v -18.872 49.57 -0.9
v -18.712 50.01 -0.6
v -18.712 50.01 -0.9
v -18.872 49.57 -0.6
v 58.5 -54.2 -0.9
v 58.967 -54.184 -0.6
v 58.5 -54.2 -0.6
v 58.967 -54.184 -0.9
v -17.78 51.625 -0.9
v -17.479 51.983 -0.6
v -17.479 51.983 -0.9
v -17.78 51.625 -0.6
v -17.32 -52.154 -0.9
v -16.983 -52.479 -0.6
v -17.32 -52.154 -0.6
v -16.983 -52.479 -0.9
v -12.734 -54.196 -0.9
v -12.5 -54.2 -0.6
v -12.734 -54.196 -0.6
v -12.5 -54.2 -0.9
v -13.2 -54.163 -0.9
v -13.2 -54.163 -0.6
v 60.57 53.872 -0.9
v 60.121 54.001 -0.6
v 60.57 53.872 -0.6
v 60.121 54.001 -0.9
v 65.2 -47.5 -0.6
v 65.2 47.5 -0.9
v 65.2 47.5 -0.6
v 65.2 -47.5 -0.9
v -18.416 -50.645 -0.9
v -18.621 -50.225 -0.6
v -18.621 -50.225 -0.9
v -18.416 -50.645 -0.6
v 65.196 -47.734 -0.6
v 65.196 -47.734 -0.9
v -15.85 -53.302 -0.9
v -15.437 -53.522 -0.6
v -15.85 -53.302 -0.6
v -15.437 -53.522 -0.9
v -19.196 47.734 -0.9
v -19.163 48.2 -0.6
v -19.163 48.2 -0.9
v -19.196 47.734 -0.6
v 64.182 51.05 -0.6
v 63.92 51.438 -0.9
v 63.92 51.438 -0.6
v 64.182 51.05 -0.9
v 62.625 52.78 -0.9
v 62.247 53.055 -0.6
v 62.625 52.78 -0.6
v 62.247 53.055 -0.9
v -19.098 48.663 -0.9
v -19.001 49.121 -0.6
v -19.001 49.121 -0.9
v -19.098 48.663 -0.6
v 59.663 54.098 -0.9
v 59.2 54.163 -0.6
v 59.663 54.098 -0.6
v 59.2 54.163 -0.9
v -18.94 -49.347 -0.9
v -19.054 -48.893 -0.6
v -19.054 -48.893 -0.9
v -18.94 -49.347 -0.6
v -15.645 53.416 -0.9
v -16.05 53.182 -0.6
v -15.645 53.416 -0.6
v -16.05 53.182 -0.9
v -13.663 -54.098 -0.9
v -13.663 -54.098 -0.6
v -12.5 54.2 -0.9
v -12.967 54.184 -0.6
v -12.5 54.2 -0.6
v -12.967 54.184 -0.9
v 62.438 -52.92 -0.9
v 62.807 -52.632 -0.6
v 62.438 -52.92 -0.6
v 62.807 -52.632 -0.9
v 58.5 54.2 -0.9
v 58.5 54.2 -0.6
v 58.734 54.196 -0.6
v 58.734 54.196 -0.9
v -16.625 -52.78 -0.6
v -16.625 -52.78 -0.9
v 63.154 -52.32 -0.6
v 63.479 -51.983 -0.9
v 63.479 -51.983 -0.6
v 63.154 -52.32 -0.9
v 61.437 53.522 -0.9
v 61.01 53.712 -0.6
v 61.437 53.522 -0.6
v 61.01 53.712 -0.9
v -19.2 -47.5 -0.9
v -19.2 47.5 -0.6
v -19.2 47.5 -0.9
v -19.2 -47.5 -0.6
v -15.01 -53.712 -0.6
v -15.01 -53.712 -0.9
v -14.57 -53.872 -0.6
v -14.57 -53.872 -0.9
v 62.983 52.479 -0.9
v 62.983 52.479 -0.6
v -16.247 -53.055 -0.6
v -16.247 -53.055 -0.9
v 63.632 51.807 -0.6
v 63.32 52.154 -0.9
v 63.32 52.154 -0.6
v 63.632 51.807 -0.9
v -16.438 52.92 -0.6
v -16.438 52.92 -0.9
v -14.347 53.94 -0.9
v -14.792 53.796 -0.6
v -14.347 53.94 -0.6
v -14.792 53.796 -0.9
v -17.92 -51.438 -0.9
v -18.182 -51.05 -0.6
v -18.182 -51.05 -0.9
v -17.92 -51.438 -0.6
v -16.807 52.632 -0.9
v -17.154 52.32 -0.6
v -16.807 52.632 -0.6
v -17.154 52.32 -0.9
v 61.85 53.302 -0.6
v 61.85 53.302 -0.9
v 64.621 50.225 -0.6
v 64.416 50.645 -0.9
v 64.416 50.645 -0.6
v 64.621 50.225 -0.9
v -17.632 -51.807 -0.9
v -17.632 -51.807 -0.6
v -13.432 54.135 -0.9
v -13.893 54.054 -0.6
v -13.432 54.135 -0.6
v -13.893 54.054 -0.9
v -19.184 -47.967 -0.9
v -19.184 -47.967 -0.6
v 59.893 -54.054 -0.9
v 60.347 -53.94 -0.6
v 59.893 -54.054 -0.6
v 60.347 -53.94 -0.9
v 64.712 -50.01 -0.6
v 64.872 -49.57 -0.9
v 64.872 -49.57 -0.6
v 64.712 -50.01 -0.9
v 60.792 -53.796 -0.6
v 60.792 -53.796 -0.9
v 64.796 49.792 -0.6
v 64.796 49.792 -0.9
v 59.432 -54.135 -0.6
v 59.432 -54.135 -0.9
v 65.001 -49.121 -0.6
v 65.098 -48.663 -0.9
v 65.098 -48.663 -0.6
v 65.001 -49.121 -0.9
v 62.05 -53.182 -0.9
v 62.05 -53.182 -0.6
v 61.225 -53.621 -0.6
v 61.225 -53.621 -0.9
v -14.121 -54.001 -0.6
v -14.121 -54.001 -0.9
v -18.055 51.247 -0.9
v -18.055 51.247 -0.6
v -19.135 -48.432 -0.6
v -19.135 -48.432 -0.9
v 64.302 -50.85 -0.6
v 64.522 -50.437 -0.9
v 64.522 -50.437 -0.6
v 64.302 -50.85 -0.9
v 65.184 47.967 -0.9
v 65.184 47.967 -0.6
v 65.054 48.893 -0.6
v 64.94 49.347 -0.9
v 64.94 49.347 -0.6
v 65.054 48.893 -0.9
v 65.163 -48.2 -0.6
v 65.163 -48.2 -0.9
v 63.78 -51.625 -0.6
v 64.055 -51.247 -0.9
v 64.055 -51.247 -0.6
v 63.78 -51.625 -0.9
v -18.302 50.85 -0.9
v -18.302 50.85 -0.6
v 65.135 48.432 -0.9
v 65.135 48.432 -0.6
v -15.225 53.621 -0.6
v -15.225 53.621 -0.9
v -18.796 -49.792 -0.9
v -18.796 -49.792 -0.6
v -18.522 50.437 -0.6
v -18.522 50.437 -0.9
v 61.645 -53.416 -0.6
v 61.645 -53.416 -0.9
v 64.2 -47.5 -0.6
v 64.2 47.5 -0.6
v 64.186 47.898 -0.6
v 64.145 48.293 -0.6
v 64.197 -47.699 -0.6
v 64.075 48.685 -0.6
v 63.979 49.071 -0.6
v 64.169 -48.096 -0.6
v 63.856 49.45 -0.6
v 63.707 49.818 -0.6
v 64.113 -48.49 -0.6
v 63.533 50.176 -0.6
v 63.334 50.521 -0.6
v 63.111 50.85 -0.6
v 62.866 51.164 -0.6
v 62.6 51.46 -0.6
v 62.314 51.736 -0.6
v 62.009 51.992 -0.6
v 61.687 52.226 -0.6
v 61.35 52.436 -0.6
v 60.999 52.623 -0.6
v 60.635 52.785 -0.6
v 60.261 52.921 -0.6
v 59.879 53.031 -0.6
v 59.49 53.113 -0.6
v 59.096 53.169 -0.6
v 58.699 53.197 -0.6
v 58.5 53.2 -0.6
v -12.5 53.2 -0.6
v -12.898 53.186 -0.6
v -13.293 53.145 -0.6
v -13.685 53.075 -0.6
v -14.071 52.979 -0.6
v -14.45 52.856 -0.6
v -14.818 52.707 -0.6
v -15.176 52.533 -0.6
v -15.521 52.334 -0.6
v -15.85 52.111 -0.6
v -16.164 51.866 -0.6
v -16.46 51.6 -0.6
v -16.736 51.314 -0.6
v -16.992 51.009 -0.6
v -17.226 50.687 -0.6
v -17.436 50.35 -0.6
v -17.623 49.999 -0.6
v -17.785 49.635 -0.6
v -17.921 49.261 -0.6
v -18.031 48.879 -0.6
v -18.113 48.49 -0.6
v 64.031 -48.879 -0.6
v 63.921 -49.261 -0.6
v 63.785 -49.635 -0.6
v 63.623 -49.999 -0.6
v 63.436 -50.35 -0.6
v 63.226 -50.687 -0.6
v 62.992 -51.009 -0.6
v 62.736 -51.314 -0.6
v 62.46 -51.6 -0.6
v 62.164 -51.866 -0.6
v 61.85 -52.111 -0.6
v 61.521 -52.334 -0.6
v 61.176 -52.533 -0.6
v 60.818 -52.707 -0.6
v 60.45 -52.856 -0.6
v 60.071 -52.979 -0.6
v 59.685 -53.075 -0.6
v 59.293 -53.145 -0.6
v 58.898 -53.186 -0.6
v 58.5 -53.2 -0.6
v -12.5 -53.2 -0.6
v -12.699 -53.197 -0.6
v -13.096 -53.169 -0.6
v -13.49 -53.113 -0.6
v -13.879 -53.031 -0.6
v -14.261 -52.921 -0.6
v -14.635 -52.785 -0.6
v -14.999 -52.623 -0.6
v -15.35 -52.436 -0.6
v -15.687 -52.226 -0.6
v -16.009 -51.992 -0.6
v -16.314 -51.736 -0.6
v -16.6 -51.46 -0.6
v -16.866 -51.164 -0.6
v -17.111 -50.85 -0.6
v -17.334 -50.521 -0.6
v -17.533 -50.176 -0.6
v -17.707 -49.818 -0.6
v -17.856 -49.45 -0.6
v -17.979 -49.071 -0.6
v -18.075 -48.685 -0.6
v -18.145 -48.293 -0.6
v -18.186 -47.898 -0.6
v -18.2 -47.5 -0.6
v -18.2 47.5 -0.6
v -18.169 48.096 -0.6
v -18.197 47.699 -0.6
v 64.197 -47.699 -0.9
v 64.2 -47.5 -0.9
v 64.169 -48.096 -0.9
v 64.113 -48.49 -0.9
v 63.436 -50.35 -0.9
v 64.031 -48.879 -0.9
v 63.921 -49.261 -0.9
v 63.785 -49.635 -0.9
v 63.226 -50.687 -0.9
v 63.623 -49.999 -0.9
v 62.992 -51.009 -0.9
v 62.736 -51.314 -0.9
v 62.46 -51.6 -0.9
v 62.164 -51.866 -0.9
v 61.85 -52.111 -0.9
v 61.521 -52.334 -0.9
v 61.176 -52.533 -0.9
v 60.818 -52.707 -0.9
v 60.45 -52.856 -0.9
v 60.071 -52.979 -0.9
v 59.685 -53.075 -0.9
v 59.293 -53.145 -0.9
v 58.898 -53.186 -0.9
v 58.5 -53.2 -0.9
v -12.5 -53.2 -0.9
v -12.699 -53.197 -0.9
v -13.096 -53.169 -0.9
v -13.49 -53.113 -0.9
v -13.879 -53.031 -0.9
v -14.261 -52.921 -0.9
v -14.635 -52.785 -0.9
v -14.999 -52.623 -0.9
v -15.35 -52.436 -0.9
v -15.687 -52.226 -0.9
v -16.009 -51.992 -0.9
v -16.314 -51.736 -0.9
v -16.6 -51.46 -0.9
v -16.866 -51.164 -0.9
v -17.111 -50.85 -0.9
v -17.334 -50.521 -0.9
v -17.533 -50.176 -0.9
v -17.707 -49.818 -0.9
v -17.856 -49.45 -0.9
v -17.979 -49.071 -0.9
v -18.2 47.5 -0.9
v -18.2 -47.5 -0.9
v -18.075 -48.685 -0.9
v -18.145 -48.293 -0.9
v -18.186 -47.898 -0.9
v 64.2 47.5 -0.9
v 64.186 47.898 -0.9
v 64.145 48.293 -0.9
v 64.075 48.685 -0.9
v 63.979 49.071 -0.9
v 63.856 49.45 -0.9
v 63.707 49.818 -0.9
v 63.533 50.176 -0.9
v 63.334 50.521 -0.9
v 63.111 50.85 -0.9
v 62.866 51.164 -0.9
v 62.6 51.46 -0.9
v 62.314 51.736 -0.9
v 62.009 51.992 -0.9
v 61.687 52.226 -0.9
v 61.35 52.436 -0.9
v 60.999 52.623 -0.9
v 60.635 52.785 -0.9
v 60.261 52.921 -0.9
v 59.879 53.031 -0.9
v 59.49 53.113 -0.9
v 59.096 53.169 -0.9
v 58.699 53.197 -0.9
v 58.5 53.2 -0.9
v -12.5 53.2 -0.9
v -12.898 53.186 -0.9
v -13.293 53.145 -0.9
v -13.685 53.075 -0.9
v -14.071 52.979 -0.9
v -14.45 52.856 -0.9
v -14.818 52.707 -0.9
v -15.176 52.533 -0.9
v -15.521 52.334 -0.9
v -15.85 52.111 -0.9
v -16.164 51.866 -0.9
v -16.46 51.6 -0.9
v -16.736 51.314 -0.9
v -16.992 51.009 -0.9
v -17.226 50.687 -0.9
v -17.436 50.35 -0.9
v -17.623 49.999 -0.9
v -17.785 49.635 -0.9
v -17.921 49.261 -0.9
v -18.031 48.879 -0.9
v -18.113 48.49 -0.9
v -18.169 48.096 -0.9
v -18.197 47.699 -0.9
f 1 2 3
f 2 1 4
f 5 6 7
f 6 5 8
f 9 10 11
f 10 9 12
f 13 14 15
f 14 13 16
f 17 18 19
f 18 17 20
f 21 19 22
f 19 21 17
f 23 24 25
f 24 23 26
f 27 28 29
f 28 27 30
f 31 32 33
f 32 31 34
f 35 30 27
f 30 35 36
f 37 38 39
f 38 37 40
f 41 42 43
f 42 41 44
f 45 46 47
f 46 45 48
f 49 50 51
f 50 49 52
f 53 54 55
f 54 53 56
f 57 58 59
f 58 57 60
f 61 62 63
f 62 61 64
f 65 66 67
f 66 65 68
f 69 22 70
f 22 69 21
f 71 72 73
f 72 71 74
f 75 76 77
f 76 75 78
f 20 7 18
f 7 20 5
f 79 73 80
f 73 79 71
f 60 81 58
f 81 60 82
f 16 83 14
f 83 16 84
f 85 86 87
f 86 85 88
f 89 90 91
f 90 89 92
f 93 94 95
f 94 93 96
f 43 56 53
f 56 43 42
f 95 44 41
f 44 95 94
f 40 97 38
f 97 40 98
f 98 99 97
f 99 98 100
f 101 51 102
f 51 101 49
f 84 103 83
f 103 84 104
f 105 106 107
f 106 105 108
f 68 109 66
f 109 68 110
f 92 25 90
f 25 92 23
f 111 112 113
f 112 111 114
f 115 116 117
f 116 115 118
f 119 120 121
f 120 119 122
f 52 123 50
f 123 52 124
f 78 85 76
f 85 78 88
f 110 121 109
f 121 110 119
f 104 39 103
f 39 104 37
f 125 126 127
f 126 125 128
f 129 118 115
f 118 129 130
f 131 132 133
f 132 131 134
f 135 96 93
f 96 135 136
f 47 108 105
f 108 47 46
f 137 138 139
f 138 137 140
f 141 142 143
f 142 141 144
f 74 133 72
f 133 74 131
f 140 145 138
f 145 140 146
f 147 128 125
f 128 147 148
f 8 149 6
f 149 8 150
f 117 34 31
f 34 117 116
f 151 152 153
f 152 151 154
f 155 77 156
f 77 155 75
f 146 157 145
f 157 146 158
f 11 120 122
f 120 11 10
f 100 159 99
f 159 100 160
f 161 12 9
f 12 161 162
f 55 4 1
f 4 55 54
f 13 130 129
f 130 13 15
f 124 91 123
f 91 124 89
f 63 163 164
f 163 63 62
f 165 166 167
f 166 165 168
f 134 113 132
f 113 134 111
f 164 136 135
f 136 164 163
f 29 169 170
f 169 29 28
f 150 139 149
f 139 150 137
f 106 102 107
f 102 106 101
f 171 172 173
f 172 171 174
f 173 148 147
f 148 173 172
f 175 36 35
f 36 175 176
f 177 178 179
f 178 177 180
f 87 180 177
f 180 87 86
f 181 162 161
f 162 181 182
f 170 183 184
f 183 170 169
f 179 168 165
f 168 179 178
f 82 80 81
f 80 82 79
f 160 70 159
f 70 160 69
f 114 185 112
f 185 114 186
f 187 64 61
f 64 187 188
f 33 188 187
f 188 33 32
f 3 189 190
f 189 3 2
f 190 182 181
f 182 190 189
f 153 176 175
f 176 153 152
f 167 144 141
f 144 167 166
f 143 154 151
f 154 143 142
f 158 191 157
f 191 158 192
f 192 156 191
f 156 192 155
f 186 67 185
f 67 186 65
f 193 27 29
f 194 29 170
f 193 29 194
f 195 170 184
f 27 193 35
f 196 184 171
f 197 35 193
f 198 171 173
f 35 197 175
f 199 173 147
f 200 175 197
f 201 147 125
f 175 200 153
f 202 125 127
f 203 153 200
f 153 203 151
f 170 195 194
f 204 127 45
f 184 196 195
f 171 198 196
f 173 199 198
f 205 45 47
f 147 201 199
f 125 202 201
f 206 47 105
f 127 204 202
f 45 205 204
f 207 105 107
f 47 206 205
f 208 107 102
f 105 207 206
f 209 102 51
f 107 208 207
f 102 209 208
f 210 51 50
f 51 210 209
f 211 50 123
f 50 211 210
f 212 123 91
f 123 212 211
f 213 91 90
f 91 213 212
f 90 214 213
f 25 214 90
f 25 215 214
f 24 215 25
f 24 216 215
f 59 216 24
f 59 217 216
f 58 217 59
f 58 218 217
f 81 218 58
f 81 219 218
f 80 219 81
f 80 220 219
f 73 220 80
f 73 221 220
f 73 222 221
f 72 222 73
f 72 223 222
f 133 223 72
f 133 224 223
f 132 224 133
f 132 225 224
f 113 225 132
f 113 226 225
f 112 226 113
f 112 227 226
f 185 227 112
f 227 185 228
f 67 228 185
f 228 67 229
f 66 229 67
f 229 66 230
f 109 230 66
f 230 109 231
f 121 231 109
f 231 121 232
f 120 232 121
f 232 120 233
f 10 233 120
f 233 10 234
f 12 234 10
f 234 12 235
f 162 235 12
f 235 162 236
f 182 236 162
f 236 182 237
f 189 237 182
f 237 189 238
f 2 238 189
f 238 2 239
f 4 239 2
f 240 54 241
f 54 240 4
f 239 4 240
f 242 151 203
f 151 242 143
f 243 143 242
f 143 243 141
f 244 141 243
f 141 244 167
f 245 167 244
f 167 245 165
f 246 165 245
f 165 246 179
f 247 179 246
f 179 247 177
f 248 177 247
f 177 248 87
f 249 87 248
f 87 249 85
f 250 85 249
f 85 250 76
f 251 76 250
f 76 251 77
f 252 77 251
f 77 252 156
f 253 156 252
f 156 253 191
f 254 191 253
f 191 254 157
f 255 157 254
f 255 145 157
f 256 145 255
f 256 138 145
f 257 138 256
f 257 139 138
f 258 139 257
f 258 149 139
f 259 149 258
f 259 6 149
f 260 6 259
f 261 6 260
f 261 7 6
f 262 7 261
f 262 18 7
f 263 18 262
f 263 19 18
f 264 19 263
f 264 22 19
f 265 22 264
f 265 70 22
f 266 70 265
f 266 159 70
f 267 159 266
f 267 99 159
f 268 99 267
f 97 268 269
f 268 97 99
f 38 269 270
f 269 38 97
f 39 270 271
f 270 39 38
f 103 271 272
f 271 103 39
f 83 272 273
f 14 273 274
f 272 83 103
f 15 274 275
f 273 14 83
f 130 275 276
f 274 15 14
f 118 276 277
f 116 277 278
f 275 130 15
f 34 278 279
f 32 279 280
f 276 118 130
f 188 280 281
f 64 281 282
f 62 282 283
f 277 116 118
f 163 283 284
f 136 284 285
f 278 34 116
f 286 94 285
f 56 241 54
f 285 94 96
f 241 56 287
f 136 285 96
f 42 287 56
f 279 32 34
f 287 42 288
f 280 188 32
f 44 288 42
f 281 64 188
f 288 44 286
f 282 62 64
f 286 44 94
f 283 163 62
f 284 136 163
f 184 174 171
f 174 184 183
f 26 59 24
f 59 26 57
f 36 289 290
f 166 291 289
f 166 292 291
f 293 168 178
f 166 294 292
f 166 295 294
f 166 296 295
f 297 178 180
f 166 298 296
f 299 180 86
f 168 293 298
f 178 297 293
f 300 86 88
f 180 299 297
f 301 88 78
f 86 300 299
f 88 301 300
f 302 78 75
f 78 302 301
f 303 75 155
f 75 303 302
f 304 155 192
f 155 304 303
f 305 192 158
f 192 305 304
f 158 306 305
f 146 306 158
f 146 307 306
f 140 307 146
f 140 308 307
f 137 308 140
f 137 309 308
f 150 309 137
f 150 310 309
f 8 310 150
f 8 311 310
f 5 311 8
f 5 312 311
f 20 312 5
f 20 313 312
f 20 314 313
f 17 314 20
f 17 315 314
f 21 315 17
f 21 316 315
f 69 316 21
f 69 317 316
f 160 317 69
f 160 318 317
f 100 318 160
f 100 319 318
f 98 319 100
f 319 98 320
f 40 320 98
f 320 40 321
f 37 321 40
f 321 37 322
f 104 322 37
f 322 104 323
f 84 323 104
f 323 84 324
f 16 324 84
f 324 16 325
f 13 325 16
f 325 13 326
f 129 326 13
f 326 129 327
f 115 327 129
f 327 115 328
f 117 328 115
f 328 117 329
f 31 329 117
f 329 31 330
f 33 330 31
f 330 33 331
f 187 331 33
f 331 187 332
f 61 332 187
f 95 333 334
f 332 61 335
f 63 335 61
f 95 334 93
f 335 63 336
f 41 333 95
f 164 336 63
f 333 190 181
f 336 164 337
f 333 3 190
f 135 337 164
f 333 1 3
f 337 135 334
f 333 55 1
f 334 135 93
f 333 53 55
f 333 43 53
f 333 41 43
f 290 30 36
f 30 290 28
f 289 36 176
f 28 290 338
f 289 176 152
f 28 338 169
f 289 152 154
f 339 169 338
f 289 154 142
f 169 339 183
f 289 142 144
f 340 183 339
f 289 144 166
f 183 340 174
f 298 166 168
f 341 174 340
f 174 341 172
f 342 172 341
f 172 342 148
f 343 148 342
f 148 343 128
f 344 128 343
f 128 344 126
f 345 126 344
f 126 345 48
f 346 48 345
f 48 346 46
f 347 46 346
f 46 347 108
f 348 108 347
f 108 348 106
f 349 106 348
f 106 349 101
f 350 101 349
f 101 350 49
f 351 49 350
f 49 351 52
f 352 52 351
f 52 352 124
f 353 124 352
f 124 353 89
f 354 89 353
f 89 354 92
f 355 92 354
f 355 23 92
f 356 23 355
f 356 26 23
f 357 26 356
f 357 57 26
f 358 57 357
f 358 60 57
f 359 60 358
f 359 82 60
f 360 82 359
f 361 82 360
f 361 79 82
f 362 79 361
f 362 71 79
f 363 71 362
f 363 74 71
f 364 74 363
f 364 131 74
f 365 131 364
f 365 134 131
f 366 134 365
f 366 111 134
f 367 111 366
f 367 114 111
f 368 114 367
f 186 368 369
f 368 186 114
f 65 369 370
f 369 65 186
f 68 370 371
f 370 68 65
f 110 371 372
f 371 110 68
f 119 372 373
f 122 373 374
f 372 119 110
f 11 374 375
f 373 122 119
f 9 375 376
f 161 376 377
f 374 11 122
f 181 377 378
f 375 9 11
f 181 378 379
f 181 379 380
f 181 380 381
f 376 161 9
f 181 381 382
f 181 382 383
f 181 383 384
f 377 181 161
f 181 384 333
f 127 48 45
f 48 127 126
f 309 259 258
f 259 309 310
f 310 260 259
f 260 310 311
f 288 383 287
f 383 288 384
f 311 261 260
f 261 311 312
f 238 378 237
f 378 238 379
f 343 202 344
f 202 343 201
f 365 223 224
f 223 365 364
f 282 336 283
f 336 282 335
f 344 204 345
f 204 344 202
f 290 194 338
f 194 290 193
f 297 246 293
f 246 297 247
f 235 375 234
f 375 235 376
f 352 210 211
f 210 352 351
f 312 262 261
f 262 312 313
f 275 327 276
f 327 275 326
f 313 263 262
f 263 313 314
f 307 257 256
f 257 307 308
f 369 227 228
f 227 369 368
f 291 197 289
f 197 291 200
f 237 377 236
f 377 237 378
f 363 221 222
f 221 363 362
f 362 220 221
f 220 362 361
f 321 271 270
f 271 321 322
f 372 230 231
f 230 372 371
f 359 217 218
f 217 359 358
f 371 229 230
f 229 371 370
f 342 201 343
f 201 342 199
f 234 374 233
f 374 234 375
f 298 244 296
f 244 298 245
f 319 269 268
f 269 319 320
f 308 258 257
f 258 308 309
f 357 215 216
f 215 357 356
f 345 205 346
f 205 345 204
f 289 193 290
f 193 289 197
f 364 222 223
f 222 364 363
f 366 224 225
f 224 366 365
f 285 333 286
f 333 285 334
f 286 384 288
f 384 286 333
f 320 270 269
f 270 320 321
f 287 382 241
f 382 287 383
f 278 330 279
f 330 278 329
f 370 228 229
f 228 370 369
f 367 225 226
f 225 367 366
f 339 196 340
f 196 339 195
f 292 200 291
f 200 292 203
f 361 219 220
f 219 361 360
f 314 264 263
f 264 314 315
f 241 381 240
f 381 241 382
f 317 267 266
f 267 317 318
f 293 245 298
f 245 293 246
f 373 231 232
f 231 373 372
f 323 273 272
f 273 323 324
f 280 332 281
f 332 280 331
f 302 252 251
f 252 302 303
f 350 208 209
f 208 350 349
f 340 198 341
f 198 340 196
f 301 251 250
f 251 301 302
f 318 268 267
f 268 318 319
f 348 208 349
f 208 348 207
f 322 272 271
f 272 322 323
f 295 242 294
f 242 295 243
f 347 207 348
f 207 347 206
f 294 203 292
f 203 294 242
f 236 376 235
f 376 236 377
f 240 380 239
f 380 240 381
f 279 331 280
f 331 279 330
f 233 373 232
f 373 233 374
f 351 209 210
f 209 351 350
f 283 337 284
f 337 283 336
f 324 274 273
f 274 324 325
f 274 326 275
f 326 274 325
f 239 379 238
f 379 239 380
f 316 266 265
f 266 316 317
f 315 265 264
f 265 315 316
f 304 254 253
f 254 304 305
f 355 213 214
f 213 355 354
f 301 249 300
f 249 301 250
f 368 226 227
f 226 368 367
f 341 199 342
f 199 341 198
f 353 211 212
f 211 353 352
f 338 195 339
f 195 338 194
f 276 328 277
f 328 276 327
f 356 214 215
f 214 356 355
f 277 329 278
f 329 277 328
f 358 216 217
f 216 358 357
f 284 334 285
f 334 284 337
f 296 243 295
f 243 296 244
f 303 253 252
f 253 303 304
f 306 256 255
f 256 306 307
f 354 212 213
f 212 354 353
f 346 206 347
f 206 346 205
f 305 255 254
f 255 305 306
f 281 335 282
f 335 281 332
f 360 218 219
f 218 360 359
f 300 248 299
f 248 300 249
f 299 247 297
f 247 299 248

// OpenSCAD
$fa=4 + 0; // default minimum facet angle is now 0.5
$fs=0.05 + 0; // default minimum facet size is now 0.05 mm
eps = .005 + 0;

/* [Print Info] */
// Nozzle diameter
_n = 0.4;
// Line Thickness
_t = _n + .05;
// Layer Height
_l = 0.3;

/* [Case Dimensions] */
// Case outer width (x direction)
cox = 30;
// Case outer length (y direction)
coy = 100;
// Case height in layers (z direction) of first side
cl1 = 25;
cz1 = _l * cl1;
// Case height in layers (z direction) of second side
cl2 = 25;
cz2 = _l * cl2;
// Case corner radius
cr = 2.5;
// Spine excess width
cst = 1;
// Connection flap height in layers (0 for disconnected)
cfl = 3;
cfz = cfl * _l;
// Connection flap offset (0 for flush with case)
cfo = 1.2;
// Wall thickness
tw = .9;

cx = cox - cr * 2;
cy = coy - cr * 2;



/* [Magnet] */
// Magnet Hole Style
mSt = 1; // [0: None, 1: Exposed]
// Magnet Hole Radius
mr = 2.45;
// Magnet Hole Depth (in layers)
ml = 7;
// Minimum magnet bottom layers
mbl = 3 + 0;
mbz = mbl * _l;
// Chamfer around top/bottom of magnet holes (in layers)
mcl = 2;

/* [Design] */
// Design Style
ds = 1; // [0: None, 1: Full Inset panel]
// Panel Offset (for inset panel design)
dpo = 1.8;
// Export Panel Outline in 2d
ep2d = false;
// Export Panel
ep = true;
// DXF Import Path
dxfPath = "/home/gouda/Documents/Models/2D/foldCasePanelCharge.dxf";
// Total DXF Layer Count
dxfLayers = 2;
// Layer to Export (-1 for background)
dxfTargetLayer = 0;

mcz = mcl * _l;
mz = (ml + mcl) * _l;

totalX = (cx * 2 + cz1 + cz2 + cst + cr * 2);

module magnetHole(r = mr, h = mz, l = _l, c = mcz) {
  cylinder(r = r, h = h - c + eps);
  translate([0, 0, h - c]) cylinder(r2 = r-c, r1 = r, h = c);
}

module caseBase(x = cx, y = cy, z = cz1, r = cr, fz = cfz, fo = cfo, mhr = mr) {
  mhr2 = mhr * 1.75;

  difference() {
    linear_extrude(z) offset(r=cr) square([cx, cy], center = true);
    for (ix=[-1:2:1]) {
      for (iy=[-1:2:1]) {
        translate([ix * (x/2+cr) - ix * (mhr2), iy * (y/2+cr) - iy * (mhr2), 0]) {
          translate([0, 0, z - mz + eps]) magnetHole(mhr);
        }
      }
    }
    intersection() {
      difference() {
        translate([0, 0, tw]) linear_extrude(z - tw + eps) offset(r=cr - tw) square([cx - 2 * tw, cy - 2 * tw], center = true);
        for (ix=[-1:2:1]) {
          for (iy=[-1:2:1]) {
            translate([ix * (x/2+cr) - ix * (mhr2), iy * (y/2+cr) - iy * (mhr2), 0]) {
              union() {
                // This might suck. Here's a simple cylinder:
                // cylinder(r = mhr2, h = z);
                translate([0, 0, z - (mz + mbz)]) cylinder(r = mhr2, h = mz + mbz);
                hull() {
                  translate([0, 0, z - (mz + mbz)]) linear_extrude(eps) circle(r = mhr2);
                  translate([ix*mhr2/sqrt(2), iy*mhr2/sqrt(2), z - (mz + mbz + mhr2 * 2)]) linear_extrude(eps) circle(r = eps);
                }
              }
            }
          }
        }
      }

      children();
    }
  }
}

module firstLayerDesign(layer = dxfTargetLayer, layers = dxfLayers, path = dxfPath) {
  lTarget = str("L", layer);
  difference() {
    intersection() {
      linear_extrude(_l) offset(r=cr + cfo - dpo) square([totalX, cy]);
      if (layer != -1) translate([-(totalX) / 2 + dpo, -cy / 2 + dpo, 0]) linear_extrude(1) import(path, layer=lTarget);
    }
    for (l1 = [layer+1:1:layers]) {
      lTarget1 = str("L", l1);
      translate([-(totalX) / 2 + dpo, -cy / 2 + dpo, -eps]) linear_extrude(1 + eps * 2) import(path, layer=lTarget1);
    }
  }
}

module integratedSkirt() {
  skirtGap = 2;
  skirtThickness = 1;
  difference() {
        translate([-cx / 2, -cy / 2, -cfz]) linear_extrude(_l) offset(r=cr + cfo + skirtGap + skirtThickness) square([cx * 2 + cz1 + cz2 + cst + cr * 2, cy]);
        translate([-cx / 2, -cy / 2, -cfz - eps]) linear_extrude(_l + 2*eps) offset(r=cr + cfo + skirtGap) square([cx * 2 + cz1 + cz2 + cst + cr * 2, cy]);
  }
} 

if (cz1 < mz || cz2 < mz) {
  text("NO ROOM FOR MAGNETS", valign = "center", halign = "center");
} else if (ds == 1 && dpo <= 0) {
  text("PANEL OFFSET CANNOT BE 0", valign = "center", halign = "center");
} else {
  integratedSkirt();
  if (ep2d) {
    translate([-cx / 2, -cy / 2, -cfz]) offset(r=cr + cfo - dpo) square([cx * 2 + cz1 + cz2 + cst + cr * 2, cy]);
  } else if (ep) {
    translate([-cx / 2, -cy / 2, -cfz]) firstLayerDesign();
  } else {
    difference() {
      union() {
        caseBase(cx, cy, cz1, cr) {
          cube([100, 100, 100], center=true);
        }
        translate([cx + cz1 + cz2 + cst + cr * 2, 0, 0]) caseBase(cx, cy, cz2, cr) {
          cube([100, 100, 100], center=true);
        }
        translate([-cx / 2, -cy / 2, -cfz]) linear_extrude(cfz) offset(r=cr + cfo) square([cx * 2 + cz1 + cz2 + cst + cr * 2, cy]);
      }
      if (ds == 1) {
        translate([-cx / 2, -cy / 2, -cfz - eps]) linear_extrude(_l + eps) offset(r=cr + cfo - dpo) square([cx * 2 + cz1 + cz2 + cst + cr * 2, cy]);
      }
    }
  }

}
